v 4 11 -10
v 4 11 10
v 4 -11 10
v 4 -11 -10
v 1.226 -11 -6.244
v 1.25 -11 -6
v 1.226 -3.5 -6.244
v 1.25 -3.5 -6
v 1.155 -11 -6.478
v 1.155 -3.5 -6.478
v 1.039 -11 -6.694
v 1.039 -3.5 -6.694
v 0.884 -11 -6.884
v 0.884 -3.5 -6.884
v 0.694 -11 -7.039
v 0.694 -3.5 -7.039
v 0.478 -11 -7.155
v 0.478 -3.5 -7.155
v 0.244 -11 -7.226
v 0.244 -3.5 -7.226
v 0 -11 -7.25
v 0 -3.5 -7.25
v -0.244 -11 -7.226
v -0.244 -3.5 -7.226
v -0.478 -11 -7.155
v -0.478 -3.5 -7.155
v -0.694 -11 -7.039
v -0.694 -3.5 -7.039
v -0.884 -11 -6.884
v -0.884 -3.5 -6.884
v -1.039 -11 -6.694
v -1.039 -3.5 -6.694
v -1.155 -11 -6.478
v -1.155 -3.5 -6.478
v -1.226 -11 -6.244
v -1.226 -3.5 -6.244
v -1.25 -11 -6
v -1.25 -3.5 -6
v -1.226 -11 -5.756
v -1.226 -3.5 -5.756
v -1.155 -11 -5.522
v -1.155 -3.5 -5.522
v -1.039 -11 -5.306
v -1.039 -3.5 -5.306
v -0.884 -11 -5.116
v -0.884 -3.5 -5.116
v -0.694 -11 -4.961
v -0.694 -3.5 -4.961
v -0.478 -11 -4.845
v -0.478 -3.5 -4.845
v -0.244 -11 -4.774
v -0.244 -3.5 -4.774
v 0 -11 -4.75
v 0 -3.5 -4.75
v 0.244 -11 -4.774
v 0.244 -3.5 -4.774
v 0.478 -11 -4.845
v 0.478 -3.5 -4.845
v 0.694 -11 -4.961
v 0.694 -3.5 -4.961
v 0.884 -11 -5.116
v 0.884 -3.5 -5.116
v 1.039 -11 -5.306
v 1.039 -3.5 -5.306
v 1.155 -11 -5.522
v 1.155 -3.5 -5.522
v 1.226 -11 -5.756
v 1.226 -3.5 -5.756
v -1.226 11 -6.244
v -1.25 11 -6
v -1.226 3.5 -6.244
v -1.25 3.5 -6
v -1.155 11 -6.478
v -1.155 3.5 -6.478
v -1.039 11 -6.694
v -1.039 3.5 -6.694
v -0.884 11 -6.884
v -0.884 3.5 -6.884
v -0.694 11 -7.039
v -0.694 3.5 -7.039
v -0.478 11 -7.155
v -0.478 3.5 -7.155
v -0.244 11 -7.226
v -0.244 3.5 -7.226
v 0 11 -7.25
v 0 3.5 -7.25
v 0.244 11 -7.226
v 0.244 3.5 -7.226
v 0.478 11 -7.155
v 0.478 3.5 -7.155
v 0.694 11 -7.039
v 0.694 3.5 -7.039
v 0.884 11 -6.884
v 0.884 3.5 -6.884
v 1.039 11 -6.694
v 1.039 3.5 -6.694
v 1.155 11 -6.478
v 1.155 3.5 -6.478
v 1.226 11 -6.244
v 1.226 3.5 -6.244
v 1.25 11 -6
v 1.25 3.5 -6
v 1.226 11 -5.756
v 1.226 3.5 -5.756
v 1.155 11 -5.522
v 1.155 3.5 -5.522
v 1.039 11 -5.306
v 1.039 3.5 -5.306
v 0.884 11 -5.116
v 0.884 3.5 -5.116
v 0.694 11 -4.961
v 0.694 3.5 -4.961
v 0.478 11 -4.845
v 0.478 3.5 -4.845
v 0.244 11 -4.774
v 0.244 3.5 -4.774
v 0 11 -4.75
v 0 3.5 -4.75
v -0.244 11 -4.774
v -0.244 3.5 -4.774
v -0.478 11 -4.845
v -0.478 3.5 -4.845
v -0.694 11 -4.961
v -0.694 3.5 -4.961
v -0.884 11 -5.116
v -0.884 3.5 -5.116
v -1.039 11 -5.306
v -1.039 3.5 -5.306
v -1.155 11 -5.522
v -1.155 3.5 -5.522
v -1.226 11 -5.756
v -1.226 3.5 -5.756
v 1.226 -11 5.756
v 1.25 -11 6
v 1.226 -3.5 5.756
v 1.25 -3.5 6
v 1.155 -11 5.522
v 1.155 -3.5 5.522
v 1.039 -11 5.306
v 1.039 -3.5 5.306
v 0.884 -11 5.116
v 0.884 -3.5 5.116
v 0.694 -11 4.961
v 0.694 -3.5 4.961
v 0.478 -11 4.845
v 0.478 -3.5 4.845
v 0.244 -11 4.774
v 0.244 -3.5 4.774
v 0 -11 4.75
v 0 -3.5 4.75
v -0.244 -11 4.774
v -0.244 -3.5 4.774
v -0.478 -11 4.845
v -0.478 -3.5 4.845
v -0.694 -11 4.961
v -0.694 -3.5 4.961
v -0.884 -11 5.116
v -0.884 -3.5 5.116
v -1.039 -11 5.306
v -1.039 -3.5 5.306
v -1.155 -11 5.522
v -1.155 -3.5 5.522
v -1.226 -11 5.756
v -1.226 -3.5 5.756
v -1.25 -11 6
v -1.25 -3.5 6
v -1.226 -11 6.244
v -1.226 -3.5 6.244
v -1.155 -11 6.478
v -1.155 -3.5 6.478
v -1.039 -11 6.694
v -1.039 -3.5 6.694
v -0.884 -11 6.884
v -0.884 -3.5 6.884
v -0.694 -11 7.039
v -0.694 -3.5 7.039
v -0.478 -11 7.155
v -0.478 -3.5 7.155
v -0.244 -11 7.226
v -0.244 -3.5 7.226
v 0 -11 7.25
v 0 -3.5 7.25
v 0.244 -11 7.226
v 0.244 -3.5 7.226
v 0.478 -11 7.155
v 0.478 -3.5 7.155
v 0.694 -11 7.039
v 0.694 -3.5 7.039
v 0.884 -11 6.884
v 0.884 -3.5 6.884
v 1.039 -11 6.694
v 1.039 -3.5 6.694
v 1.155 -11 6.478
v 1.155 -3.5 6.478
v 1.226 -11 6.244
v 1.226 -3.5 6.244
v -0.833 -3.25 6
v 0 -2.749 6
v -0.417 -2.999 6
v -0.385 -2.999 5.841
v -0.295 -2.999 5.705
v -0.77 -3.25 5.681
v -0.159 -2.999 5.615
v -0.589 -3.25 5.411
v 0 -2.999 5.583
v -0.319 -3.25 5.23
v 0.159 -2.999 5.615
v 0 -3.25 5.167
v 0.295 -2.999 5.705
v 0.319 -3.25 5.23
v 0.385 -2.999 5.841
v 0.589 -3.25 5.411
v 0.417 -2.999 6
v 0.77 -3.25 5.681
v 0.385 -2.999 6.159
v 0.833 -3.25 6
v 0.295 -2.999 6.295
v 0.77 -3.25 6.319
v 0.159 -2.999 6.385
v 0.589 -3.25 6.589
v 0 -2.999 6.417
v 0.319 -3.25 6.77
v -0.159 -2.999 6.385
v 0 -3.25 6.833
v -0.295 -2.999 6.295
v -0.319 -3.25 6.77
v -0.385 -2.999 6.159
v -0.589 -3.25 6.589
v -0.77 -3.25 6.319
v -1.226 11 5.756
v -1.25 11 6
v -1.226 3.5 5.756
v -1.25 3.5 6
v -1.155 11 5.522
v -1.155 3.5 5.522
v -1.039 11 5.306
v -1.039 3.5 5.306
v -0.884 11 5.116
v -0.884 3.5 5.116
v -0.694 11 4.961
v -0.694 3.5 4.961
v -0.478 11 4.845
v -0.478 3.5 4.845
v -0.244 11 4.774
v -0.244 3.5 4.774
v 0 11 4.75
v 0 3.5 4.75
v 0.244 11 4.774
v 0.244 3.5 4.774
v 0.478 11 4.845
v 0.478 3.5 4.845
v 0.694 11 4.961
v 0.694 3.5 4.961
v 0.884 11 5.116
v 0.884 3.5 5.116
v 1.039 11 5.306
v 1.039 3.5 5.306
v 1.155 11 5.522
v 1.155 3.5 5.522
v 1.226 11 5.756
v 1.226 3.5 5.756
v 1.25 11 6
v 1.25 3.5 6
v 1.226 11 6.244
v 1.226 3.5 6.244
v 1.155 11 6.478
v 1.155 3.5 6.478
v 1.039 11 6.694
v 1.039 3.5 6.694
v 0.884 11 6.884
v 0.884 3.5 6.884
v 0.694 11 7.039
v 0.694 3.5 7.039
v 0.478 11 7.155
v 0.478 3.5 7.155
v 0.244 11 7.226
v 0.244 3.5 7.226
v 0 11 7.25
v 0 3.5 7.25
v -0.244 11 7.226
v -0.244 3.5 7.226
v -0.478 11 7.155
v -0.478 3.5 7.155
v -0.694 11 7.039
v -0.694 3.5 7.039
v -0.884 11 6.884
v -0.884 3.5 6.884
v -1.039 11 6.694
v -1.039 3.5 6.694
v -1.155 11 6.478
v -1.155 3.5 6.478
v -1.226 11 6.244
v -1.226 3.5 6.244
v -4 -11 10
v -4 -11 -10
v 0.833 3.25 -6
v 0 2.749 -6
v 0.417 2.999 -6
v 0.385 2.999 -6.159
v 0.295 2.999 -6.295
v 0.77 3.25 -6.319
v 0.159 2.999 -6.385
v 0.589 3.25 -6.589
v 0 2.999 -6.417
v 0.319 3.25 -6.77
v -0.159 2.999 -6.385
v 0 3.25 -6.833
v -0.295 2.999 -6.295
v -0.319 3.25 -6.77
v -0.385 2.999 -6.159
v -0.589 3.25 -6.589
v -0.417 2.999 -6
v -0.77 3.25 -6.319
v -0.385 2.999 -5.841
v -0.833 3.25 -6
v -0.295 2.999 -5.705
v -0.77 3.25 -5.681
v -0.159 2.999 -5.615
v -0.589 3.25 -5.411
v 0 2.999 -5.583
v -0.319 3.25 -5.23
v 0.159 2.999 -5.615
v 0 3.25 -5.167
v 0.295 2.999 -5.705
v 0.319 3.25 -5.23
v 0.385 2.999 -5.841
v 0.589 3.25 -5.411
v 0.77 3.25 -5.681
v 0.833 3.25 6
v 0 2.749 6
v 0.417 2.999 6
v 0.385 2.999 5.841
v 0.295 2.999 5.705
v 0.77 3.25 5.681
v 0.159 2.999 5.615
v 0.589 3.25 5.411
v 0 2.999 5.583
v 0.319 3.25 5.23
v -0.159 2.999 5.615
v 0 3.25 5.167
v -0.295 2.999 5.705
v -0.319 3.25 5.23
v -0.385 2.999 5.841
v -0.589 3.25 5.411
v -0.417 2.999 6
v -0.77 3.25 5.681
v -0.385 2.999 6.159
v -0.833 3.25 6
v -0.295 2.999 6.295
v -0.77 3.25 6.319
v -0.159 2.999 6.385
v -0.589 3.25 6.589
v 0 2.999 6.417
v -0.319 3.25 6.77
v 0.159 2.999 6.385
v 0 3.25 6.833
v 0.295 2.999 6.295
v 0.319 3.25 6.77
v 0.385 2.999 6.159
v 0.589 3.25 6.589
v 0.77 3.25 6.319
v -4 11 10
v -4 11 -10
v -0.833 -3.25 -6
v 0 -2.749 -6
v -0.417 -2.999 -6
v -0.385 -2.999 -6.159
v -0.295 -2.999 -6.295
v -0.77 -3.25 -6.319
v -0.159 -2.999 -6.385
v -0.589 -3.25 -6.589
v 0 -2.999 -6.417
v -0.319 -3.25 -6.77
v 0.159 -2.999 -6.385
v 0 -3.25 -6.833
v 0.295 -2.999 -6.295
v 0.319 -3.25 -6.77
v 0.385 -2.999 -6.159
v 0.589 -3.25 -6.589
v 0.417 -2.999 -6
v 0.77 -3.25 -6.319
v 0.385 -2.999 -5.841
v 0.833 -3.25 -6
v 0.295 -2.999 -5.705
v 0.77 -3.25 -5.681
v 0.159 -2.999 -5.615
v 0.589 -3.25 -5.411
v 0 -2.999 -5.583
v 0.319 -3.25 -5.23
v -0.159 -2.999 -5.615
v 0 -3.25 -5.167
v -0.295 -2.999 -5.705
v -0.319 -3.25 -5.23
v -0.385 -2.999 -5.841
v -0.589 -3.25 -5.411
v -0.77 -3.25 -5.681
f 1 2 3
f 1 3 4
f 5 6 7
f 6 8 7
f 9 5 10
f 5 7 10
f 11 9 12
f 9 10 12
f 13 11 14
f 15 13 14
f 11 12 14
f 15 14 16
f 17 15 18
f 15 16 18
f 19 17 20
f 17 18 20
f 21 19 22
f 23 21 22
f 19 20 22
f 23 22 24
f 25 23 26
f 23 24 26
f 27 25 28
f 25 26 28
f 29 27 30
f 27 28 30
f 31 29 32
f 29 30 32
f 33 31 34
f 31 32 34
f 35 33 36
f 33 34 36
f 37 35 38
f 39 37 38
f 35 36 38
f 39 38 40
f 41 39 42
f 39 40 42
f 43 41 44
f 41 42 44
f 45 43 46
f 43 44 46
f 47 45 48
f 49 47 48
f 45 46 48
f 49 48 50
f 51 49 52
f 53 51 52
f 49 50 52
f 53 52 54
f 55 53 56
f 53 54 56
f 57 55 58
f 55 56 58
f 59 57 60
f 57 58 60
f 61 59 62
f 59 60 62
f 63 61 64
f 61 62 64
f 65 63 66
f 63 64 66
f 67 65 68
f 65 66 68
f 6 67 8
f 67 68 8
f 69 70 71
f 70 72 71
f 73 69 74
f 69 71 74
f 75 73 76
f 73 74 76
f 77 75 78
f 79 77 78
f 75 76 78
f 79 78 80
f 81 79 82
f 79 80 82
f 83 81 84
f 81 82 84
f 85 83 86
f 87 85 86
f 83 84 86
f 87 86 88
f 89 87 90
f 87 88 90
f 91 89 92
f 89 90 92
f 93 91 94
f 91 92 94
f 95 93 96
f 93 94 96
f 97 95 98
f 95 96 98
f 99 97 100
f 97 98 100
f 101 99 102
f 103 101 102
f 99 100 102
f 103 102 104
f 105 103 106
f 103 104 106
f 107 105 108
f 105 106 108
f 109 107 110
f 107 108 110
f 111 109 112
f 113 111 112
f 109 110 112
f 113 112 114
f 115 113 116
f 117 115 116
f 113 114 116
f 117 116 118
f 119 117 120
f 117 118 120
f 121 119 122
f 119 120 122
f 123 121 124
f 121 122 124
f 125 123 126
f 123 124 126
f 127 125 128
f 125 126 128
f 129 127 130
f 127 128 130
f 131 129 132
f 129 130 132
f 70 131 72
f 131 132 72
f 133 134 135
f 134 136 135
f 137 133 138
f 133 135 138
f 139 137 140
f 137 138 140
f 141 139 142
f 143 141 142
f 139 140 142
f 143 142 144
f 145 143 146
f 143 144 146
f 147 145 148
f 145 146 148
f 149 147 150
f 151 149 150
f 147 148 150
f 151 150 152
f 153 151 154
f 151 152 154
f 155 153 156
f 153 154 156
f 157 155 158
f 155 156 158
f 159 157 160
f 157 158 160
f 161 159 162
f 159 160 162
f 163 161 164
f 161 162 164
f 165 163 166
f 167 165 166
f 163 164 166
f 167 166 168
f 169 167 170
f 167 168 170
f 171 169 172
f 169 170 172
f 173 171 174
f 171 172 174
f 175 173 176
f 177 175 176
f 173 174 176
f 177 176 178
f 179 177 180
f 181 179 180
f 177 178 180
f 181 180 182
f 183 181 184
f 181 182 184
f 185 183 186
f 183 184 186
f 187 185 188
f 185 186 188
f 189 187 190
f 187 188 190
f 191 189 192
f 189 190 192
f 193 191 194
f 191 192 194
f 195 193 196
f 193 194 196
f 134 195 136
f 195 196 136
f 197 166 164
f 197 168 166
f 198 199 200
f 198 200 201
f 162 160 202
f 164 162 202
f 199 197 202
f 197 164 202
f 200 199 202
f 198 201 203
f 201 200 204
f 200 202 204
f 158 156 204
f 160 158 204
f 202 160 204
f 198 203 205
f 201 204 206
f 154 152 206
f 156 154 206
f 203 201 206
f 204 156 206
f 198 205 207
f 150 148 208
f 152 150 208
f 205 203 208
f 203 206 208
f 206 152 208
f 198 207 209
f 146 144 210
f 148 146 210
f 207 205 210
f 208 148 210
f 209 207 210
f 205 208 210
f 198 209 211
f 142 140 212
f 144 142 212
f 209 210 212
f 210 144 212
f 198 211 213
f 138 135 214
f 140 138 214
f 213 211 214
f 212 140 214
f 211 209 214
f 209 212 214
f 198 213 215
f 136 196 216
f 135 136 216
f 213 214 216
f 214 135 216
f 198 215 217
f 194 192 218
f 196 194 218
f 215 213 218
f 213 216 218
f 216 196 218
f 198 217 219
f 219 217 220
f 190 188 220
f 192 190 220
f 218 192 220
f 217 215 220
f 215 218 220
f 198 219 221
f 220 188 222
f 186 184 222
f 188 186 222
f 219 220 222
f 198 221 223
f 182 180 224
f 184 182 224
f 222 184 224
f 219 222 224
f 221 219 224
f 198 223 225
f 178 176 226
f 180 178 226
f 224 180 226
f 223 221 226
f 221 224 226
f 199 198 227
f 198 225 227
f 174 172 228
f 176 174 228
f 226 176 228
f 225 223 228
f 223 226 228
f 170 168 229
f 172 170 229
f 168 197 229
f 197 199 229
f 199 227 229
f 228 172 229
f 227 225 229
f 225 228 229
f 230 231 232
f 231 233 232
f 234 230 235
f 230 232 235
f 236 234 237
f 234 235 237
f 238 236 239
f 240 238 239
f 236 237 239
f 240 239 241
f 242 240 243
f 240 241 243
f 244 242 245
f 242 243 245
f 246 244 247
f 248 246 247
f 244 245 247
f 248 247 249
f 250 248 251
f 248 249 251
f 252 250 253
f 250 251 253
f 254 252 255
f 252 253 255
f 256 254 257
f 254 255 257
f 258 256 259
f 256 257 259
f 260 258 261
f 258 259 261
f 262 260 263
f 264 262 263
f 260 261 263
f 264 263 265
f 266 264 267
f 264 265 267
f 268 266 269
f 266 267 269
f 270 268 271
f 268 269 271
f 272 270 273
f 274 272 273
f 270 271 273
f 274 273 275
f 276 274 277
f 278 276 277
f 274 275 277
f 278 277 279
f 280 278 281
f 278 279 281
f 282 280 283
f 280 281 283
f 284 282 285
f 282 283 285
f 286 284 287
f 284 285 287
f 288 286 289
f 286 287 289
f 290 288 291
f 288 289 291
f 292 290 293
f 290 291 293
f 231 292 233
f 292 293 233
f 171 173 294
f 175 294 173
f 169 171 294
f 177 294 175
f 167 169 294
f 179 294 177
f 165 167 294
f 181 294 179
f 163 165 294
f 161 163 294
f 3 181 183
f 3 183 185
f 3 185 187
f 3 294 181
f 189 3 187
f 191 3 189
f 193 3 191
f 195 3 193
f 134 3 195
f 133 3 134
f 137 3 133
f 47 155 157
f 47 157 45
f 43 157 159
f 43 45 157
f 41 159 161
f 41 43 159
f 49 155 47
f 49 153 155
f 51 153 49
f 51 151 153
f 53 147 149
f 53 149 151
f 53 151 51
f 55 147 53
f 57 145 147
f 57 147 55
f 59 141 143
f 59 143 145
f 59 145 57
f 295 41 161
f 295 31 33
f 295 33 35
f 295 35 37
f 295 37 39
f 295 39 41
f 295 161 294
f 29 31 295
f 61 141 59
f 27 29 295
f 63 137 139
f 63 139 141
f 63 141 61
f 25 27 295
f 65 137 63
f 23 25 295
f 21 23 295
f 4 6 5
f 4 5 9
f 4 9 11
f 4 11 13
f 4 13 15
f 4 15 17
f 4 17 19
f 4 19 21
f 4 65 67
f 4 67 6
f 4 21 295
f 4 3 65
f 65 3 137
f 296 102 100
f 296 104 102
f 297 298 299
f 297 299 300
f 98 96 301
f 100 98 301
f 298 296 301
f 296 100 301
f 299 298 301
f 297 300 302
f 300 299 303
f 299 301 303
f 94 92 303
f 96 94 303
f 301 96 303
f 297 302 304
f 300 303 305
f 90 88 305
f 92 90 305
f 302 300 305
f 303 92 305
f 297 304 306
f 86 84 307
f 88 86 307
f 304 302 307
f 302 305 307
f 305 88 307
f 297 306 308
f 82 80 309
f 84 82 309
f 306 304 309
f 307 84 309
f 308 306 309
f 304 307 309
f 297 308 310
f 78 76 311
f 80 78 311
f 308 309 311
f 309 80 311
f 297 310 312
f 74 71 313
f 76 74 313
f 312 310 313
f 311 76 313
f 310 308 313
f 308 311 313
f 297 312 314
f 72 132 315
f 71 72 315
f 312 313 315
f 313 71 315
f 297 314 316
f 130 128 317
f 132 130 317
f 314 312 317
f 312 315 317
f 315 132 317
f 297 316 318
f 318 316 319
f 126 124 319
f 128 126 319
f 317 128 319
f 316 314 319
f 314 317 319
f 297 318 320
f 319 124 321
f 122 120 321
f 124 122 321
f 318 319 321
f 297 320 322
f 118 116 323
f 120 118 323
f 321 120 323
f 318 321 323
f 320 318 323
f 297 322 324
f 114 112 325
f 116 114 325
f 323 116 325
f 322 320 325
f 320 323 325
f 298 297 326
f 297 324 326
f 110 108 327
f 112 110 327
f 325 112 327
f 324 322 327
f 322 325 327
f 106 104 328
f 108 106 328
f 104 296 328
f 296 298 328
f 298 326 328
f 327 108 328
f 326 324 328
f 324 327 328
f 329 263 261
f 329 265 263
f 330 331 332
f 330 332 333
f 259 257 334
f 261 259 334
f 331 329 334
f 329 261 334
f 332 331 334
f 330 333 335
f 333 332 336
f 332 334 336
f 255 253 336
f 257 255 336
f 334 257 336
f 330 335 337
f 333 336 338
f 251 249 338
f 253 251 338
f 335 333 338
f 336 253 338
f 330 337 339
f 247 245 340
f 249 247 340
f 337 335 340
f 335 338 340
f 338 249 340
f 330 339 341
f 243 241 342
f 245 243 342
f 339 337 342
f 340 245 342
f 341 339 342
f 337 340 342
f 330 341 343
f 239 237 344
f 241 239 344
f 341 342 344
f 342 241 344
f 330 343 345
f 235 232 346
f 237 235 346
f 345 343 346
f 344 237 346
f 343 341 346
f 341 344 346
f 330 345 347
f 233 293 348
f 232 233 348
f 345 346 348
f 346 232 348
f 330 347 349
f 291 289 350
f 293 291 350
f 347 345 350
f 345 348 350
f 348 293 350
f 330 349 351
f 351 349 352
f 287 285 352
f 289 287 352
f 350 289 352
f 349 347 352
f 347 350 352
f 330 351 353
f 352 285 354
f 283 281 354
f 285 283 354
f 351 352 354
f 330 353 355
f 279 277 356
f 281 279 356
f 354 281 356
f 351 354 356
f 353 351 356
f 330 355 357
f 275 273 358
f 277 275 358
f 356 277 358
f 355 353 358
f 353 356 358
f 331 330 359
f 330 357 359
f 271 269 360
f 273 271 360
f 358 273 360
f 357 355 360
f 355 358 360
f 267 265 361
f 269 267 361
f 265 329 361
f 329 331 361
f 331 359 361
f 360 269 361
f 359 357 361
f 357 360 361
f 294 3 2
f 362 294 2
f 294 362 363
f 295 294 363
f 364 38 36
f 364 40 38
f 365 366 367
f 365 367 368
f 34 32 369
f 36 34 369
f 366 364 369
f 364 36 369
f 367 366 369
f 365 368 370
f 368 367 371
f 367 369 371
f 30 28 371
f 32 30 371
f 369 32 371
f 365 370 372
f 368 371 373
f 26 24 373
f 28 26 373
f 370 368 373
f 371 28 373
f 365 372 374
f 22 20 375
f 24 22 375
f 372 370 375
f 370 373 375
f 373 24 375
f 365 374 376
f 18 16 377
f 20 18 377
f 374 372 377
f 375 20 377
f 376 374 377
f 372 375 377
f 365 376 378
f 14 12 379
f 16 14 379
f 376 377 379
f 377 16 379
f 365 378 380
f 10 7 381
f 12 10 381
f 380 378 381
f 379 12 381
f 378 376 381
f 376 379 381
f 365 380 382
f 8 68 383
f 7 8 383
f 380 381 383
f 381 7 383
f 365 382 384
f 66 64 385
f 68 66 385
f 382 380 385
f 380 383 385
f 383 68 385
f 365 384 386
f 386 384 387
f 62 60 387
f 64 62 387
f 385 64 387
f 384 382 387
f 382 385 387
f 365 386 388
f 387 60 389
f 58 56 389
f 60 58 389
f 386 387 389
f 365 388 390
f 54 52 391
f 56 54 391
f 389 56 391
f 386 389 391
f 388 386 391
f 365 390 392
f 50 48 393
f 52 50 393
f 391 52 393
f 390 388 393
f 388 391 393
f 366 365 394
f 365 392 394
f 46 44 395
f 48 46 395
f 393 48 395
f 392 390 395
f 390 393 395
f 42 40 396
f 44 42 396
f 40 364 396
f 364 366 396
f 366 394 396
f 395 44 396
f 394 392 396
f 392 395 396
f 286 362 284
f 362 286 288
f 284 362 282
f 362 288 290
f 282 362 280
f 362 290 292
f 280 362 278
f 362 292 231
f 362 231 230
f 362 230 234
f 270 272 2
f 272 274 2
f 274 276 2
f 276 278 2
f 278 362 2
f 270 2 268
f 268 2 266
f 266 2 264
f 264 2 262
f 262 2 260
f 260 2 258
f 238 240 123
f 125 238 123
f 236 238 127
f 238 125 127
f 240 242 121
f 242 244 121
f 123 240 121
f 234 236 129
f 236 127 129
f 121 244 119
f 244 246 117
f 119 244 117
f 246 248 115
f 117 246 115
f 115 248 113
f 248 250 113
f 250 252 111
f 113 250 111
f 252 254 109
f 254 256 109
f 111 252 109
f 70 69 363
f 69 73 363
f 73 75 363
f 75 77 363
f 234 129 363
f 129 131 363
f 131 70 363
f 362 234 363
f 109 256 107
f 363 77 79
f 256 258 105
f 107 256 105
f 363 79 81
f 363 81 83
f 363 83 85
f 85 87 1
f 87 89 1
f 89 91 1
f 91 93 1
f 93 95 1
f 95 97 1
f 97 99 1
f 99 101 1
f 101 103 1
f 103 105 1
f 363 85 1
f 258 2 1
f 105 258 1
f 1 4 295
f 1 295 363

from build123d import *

# Parameters (mm, degrees)
SKETCH1_W                 = 20
SKETCH1_H                 = 22
BOSS_EXTRUDE1_DEPTH       = 4
M3X0_5_TAPPED_HOLE1_D     = 2.5
M3X0_5_TAPPED_HOLE1_DEPTH = 7.5
M3X0_5_TAPPED_HOLE1_TIP   = 0.751075774
M3X0_5_TAPPED_HOLE2_D     = 2.5
M3X0_5_TAPPED_HOLE2_DEPTH = 7.5
M3X0_5_TAPPED_HOLE2_TIP   = 0.751075774


with BuildPart() as part:
    # Sketch1 → Boss-Extrude1 (new body, symmetric)
    with BuildSketch(Plane(origin=(0, 0, 0), x_dir=(0, 0, -1), z_dir=(1, 0, 0))):
        Rectangle(SKETCH1_W, SKETCH1_H)
    extrude(amount=BOSS_EXTRUDE1_DEPTH, both=True)

    # M3x0.5 Tapped Hole1
    with Locations(Plane(origin=(0, 11, 0), x_dir=(1, 0, 0), z_dir=(0, 1, 0))):
        with Locations((0, 6), (0, -6)):
            Hole(M3X0_5_TAPPED_HOLE1_D / 2, depth=M3X0_5_TAPPED_HOLE1_DEPTH)
            with Locations((0, 0, -(M3X0_5_TAPPED_HOLE1_DEPTH + M3X0_5_TAPPED_HOLE1_TIP / 2))):  # 118° drill point
                Cone(0, M3X0_5_TAPPED_HOLE1_D / 2, M3X0_5_TAPPED_HOLE1_TIP, mode=Mode.SUBTRACT)

    # M3x0.5 Tapped Hole2
    with Locations(Plane(origin=(0, -11, 0), x_dir=(-1, 0, 0), z_dir=(0, -1, 0))):
        with Locations((0, -6), (0, 6)):
            Hole(M3X0_5_TAPPED_HOLE2_D / 2, depth=M3X0_5_TAPPED_HOLE2_DEPTH)
            with Locations((0, 0, -(M3X0_5_TAPPED_HOLE2_DEPTH + M3X0_5_TAPPED_HOLE2_TIP / 2))):  # 118° drill point
                Cone(0, M3X0_5_TAPPED_HOLE2_D / 2, M3X0_5_TAPPED_HOLE2_TIP, mode=Mode.SUBTRACT)


solid = part.part
